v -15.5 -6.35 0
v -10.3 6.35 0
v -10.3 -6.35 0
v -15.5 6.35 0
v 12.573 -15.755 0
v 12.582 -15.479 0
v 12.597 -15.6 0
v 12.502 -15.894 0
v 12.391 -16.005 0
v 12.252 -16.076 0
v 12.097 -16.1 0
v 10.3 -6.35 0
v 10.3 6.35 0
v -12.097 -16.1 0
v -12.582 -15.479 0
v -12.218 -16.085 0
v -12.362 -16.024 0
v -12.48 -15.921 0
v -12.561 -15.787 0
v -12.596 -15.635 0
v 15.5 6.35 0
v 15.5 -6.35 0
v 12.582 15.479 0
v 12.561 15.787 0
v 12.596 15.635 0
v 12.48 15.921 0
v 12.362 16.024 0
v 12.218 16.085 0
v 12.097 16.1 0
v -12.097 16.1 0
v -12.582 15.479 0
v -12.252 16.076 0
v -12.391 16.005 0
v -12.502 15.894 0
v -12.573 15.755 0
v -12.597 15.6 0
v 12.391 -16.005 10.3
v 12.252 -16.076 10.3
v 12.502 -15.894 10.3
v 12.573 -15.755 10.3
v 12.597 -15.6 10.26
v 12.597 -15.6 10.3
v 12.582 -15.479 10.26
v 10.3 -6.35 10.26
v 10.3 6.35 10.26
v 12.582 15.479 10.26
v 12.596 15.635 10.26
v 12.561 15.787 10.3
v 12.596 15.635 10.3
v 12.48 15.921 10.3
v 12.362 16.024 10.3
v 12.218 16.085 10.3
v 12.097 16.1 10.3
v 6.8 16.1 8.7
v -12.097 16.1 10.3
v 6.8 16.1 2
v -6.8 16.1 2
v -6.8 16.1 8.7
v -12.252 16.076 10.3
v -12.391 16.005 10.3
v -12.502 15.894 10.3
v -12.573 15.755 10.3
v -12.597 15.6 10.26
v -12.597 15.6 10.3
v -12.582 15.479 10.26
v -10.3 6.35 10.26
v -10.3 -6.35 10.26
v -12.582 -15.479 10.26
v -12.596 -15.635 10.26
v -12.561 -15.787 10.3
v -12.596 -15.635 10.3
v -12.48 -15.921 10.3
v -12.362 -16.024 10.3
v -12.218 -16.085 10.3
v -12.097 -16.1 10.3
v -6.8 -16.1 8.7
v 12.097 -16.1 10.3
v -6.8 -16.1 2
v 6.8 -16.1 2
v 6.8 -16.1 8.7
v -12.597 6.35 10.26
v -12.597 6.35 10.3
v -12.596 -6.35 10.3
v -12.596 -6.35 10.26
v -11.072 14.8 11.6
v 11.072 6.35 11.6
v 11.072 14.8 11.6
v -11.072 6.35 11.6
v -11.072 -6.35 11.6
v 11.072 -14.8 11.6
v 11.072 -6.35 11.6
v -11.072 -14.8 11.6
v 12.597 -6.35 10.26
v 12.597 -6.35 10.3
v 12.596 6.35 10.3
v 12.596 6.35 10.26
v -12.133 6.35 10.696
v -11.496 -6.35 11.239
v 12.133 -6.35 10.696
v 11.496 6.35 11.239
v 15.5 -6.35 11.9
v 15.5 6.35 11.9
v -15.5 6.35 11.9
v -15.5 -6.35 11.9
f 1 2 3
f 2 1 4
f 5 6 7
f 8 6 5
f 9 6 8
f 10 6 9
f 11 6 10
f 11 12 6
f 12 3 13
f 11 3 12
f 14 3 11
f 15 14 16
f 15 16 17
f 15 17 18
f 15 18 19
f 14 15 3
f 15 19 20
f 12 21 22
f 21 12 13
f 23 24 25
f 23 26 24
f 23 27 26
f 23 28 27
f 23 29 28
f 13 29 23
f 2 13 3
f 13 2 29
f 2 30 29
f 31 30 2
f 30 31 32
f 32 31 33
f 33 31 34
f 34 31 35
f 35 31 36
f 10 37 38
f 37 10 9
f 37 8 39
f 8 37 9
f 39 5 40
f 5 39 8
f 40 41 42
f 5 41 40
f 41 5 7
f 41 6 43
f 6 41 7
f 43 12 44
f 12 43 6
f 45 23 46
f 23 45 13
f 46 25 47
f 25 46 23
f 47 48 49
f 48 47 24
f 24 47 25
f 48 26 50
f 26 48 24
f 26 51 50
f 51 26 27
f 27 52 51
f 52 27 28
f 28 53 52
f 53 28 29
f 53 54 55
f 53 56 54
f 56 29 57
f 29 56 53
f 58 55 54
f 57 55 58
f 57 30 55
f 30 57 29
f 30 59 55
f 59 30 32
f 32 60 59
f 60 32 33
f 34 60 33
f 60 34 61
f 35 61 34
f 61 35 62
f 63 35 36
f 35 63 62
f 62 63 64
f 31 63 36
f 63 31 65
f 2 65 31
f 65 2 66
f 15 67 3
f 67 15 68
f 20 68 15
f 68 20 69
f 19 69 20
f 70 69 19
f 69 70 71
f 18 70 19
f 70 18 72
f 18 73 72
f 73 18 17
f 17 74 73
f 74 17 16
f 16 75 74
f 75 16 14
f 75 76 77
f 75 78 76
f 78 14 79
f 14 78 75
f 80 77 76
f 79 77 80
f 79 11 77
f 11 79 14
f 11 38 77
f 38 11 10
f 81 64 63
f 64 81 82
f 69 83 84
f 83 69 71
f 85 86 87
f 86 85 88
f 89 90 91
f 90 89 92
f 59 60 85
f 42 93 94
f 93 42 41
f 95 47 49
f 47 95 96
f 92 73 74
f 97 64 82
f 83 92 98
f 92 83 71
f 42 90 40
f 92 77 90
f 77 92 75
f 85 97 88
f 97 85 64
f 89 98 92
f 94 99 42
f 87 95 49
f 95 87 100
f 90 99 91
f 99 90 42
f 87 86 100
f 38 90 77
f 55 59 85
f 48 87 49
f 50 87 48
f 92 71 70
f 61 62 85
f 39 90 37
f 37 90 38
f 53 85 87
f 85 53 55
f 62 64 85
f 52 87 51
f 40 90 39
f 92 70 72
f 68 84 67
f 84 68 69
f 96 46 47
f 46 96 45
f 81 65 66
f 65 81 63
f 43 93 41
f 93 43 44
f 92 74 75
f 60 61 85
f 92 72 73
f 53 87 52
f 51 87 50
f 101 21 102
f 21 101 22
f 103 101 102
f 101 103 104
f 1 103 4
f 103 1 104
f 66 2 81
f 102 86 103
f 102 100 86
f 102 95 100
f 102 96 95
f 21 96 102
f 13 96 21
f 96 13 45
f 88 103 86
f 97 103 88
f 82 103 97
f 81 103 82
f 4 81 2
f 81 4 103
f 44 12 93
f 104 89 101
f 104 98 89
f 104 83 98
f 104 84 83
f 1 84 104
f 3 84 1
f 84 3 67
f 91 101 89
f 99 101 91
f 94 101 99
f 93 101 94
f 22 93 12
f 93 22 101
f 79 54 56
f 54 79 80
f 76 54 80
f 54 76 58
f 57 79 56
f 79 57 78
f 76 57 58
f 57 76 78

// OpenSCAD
// file: connector_key_vertical.scad
// Universal Rear-Entry Interlocking Hollow Double-Dovetail ("Bowtie") Conduit Key
// Inserts straight into the flat BACK face of two mating letters (+Y -> -Y) where there is zero front-bezel overhang!
//   - Prints flat on its smooth 2.00 mm rear cap face (Z = 0 on build plate) with ZERO supports; continuous axial
//     perimeter loops carry >25 kg tensile load.
//   - Leading top edge (Z = 10.30 -> 11.60 mm) has a matching 1.30 mm x 45 deg chamfer that seats squarely against
//     the base socket's internal 45 deg positive depth-stop bevel so the back of the key sits dead-flush at Y = +12.40 mm!
//   - Center 13.60 mm channel fits a 10 mm or 12 mm WS2812B LED strip (or 3-pin JST-SM plug) right inside it.

dovetail_clearance = 0.20;        // Per-side XY clearance against female base mortise (mm)
end_clearance      = 0.25;        // Tip clearance so mating letter housings pull 100% tight face-to-face (mm)
bridge_gap         = 12.70;       // Letter-to-letter seam gap (mm): key spans the gap + 9.75 mm into each letter (length = gap + 19.5 mm)
straddle_open      = true;        // true = open inward U-channel (drop LED strip in, press key over it); false = closed tunnel

mortise_waist_w    = 21.00;
mortise_head_w     = 26.00;
mortise_depth      = 10.00;
key_body_h         = 10.30;       // Full-width dovetail height (seats into 10.50 mm straight rear mortise)
lead_chamfer       = 1.30;        // 45 deg leading-edge chamfer matching base's internal depth-stop seat (total Z = 11.60 mm)
bore_w             = 13.60;       // Clear internal width for 10 mm / 12 mm LED strip or JST-SM plug (mm)
rear_cap_t         = 2.00;        // Solid flush outer back cap (seals the rear seam opaque black at Y = +10.40 .. +12.40 mm!)
inner_web_t        = 1.60;        // Used only when straddle_open = false (leaves 6.70 mm x 13.60 mm enclosed box tunnel)
collar_w           = 31.00;       // Outer width of center bridge collar when bridge_gap > 0
collar_thick_y     = 11.90;       // Spans Y = +0.50 .. +12.40 mm when bridge_gap > 0

module bowtie_2d(gap, L, w0, w1, inset = 0) {
    half_g = gap / 2;
    offset(delta = -inset)
        offset(r = 0.5, $fn = 20) offset(delta = -0.5)
            polygon([
                [-w0, -half_g],
                [-w1, -(half_g + L)],
                [ w1, -(half_g + L)],
                [ w0, -half_g],
                [ w0,  half_g],
                [ w1,  half_g + L],
                [-w1,  half_g + L],
                [-w0,  half_g]
            ]);
}

module bowtie_key(gap = bridge_gap, straddle = straddle_open, clr = dovetail_clearance) {
    L = mortise_depth - end_clearance; // 9.75 mm insertion per side
    slope = ((mortise_head_w - mortise_waist_w) / 2) / mortise_depth; // 0.25 (14.04 deg)
    w0 = mortise_waist_w / 2 - clr;    // 10.30 mm
    w1 = w0 + slope * L;               // 12.74 mm
    half_g = gap / 2;
    total_len = 2 * (half_g + L);
    total_z = key_body_h + lead_chamfer; // 11.60 mm

    difference() {
        union() {
            // Straight rear-entry dovetail body (Z = 0 .. 10.30 mm) + 45 deg leading seat chamfer (Z = 10.30 .. 11.60 mm)
            linear_extrude(height = key_body_h)
                bowtie_2d(gap, L, w0, w1, 0);
            hull() {
                translate([0, 0, key_body_h - 0.04])
                    linear_extrude(height = 0.04) bowtie_2d(gap, L, w0, w1, 0);
                translate([0, 0, total_z - 0.04])
                    linear_extrude(height = 0.04) bowtie_2d(gap, L, w0, w1, lead_chamfer);
            }

            // Enclosed black spacer collar across non-zero bridge gaps (FL/FR side bridges)
            if (gap > 0.01)
                translate([-collar_w / 2, -half_g, 0])
                    cube([collar_w, gap, collar_thick_y]);
        }

        // Center 13.60 mm LED-strip channel: open U (straddle) across the full key length, gap included
        if (straddle) {
            // Open U-channel facing INWARD (-Y inside the lamp), solid 2.00 mm rear cap flush on the outside back!
            translate([-bore_w / 2, -total_len / 2 - 1, rear_cap_t])
                cube([bore_w, total_len + 2, total_z + 2]);
        } else {
            // Closed rectangular box tunnel (13.60 x 6.70 mm) enclosed front & back
            translate([-bore_w / 2, -total_len / 2 - 1, rear_cap_t])
                cube([bore_w, total_len + 2, key_body_h - rear_cap_t - inner_web_t]);
        }
    }
}

bowtie_key();
// main file
// Closed-Tunnel Box-Beam Variant of the Vertical Interlocking Hollow Bowtie Key (print 8x if threading strip / JST-SM plugs through)

use <connector_key_vertical.scad>

bowtie_key(gap = 12.70, straddle = false);
